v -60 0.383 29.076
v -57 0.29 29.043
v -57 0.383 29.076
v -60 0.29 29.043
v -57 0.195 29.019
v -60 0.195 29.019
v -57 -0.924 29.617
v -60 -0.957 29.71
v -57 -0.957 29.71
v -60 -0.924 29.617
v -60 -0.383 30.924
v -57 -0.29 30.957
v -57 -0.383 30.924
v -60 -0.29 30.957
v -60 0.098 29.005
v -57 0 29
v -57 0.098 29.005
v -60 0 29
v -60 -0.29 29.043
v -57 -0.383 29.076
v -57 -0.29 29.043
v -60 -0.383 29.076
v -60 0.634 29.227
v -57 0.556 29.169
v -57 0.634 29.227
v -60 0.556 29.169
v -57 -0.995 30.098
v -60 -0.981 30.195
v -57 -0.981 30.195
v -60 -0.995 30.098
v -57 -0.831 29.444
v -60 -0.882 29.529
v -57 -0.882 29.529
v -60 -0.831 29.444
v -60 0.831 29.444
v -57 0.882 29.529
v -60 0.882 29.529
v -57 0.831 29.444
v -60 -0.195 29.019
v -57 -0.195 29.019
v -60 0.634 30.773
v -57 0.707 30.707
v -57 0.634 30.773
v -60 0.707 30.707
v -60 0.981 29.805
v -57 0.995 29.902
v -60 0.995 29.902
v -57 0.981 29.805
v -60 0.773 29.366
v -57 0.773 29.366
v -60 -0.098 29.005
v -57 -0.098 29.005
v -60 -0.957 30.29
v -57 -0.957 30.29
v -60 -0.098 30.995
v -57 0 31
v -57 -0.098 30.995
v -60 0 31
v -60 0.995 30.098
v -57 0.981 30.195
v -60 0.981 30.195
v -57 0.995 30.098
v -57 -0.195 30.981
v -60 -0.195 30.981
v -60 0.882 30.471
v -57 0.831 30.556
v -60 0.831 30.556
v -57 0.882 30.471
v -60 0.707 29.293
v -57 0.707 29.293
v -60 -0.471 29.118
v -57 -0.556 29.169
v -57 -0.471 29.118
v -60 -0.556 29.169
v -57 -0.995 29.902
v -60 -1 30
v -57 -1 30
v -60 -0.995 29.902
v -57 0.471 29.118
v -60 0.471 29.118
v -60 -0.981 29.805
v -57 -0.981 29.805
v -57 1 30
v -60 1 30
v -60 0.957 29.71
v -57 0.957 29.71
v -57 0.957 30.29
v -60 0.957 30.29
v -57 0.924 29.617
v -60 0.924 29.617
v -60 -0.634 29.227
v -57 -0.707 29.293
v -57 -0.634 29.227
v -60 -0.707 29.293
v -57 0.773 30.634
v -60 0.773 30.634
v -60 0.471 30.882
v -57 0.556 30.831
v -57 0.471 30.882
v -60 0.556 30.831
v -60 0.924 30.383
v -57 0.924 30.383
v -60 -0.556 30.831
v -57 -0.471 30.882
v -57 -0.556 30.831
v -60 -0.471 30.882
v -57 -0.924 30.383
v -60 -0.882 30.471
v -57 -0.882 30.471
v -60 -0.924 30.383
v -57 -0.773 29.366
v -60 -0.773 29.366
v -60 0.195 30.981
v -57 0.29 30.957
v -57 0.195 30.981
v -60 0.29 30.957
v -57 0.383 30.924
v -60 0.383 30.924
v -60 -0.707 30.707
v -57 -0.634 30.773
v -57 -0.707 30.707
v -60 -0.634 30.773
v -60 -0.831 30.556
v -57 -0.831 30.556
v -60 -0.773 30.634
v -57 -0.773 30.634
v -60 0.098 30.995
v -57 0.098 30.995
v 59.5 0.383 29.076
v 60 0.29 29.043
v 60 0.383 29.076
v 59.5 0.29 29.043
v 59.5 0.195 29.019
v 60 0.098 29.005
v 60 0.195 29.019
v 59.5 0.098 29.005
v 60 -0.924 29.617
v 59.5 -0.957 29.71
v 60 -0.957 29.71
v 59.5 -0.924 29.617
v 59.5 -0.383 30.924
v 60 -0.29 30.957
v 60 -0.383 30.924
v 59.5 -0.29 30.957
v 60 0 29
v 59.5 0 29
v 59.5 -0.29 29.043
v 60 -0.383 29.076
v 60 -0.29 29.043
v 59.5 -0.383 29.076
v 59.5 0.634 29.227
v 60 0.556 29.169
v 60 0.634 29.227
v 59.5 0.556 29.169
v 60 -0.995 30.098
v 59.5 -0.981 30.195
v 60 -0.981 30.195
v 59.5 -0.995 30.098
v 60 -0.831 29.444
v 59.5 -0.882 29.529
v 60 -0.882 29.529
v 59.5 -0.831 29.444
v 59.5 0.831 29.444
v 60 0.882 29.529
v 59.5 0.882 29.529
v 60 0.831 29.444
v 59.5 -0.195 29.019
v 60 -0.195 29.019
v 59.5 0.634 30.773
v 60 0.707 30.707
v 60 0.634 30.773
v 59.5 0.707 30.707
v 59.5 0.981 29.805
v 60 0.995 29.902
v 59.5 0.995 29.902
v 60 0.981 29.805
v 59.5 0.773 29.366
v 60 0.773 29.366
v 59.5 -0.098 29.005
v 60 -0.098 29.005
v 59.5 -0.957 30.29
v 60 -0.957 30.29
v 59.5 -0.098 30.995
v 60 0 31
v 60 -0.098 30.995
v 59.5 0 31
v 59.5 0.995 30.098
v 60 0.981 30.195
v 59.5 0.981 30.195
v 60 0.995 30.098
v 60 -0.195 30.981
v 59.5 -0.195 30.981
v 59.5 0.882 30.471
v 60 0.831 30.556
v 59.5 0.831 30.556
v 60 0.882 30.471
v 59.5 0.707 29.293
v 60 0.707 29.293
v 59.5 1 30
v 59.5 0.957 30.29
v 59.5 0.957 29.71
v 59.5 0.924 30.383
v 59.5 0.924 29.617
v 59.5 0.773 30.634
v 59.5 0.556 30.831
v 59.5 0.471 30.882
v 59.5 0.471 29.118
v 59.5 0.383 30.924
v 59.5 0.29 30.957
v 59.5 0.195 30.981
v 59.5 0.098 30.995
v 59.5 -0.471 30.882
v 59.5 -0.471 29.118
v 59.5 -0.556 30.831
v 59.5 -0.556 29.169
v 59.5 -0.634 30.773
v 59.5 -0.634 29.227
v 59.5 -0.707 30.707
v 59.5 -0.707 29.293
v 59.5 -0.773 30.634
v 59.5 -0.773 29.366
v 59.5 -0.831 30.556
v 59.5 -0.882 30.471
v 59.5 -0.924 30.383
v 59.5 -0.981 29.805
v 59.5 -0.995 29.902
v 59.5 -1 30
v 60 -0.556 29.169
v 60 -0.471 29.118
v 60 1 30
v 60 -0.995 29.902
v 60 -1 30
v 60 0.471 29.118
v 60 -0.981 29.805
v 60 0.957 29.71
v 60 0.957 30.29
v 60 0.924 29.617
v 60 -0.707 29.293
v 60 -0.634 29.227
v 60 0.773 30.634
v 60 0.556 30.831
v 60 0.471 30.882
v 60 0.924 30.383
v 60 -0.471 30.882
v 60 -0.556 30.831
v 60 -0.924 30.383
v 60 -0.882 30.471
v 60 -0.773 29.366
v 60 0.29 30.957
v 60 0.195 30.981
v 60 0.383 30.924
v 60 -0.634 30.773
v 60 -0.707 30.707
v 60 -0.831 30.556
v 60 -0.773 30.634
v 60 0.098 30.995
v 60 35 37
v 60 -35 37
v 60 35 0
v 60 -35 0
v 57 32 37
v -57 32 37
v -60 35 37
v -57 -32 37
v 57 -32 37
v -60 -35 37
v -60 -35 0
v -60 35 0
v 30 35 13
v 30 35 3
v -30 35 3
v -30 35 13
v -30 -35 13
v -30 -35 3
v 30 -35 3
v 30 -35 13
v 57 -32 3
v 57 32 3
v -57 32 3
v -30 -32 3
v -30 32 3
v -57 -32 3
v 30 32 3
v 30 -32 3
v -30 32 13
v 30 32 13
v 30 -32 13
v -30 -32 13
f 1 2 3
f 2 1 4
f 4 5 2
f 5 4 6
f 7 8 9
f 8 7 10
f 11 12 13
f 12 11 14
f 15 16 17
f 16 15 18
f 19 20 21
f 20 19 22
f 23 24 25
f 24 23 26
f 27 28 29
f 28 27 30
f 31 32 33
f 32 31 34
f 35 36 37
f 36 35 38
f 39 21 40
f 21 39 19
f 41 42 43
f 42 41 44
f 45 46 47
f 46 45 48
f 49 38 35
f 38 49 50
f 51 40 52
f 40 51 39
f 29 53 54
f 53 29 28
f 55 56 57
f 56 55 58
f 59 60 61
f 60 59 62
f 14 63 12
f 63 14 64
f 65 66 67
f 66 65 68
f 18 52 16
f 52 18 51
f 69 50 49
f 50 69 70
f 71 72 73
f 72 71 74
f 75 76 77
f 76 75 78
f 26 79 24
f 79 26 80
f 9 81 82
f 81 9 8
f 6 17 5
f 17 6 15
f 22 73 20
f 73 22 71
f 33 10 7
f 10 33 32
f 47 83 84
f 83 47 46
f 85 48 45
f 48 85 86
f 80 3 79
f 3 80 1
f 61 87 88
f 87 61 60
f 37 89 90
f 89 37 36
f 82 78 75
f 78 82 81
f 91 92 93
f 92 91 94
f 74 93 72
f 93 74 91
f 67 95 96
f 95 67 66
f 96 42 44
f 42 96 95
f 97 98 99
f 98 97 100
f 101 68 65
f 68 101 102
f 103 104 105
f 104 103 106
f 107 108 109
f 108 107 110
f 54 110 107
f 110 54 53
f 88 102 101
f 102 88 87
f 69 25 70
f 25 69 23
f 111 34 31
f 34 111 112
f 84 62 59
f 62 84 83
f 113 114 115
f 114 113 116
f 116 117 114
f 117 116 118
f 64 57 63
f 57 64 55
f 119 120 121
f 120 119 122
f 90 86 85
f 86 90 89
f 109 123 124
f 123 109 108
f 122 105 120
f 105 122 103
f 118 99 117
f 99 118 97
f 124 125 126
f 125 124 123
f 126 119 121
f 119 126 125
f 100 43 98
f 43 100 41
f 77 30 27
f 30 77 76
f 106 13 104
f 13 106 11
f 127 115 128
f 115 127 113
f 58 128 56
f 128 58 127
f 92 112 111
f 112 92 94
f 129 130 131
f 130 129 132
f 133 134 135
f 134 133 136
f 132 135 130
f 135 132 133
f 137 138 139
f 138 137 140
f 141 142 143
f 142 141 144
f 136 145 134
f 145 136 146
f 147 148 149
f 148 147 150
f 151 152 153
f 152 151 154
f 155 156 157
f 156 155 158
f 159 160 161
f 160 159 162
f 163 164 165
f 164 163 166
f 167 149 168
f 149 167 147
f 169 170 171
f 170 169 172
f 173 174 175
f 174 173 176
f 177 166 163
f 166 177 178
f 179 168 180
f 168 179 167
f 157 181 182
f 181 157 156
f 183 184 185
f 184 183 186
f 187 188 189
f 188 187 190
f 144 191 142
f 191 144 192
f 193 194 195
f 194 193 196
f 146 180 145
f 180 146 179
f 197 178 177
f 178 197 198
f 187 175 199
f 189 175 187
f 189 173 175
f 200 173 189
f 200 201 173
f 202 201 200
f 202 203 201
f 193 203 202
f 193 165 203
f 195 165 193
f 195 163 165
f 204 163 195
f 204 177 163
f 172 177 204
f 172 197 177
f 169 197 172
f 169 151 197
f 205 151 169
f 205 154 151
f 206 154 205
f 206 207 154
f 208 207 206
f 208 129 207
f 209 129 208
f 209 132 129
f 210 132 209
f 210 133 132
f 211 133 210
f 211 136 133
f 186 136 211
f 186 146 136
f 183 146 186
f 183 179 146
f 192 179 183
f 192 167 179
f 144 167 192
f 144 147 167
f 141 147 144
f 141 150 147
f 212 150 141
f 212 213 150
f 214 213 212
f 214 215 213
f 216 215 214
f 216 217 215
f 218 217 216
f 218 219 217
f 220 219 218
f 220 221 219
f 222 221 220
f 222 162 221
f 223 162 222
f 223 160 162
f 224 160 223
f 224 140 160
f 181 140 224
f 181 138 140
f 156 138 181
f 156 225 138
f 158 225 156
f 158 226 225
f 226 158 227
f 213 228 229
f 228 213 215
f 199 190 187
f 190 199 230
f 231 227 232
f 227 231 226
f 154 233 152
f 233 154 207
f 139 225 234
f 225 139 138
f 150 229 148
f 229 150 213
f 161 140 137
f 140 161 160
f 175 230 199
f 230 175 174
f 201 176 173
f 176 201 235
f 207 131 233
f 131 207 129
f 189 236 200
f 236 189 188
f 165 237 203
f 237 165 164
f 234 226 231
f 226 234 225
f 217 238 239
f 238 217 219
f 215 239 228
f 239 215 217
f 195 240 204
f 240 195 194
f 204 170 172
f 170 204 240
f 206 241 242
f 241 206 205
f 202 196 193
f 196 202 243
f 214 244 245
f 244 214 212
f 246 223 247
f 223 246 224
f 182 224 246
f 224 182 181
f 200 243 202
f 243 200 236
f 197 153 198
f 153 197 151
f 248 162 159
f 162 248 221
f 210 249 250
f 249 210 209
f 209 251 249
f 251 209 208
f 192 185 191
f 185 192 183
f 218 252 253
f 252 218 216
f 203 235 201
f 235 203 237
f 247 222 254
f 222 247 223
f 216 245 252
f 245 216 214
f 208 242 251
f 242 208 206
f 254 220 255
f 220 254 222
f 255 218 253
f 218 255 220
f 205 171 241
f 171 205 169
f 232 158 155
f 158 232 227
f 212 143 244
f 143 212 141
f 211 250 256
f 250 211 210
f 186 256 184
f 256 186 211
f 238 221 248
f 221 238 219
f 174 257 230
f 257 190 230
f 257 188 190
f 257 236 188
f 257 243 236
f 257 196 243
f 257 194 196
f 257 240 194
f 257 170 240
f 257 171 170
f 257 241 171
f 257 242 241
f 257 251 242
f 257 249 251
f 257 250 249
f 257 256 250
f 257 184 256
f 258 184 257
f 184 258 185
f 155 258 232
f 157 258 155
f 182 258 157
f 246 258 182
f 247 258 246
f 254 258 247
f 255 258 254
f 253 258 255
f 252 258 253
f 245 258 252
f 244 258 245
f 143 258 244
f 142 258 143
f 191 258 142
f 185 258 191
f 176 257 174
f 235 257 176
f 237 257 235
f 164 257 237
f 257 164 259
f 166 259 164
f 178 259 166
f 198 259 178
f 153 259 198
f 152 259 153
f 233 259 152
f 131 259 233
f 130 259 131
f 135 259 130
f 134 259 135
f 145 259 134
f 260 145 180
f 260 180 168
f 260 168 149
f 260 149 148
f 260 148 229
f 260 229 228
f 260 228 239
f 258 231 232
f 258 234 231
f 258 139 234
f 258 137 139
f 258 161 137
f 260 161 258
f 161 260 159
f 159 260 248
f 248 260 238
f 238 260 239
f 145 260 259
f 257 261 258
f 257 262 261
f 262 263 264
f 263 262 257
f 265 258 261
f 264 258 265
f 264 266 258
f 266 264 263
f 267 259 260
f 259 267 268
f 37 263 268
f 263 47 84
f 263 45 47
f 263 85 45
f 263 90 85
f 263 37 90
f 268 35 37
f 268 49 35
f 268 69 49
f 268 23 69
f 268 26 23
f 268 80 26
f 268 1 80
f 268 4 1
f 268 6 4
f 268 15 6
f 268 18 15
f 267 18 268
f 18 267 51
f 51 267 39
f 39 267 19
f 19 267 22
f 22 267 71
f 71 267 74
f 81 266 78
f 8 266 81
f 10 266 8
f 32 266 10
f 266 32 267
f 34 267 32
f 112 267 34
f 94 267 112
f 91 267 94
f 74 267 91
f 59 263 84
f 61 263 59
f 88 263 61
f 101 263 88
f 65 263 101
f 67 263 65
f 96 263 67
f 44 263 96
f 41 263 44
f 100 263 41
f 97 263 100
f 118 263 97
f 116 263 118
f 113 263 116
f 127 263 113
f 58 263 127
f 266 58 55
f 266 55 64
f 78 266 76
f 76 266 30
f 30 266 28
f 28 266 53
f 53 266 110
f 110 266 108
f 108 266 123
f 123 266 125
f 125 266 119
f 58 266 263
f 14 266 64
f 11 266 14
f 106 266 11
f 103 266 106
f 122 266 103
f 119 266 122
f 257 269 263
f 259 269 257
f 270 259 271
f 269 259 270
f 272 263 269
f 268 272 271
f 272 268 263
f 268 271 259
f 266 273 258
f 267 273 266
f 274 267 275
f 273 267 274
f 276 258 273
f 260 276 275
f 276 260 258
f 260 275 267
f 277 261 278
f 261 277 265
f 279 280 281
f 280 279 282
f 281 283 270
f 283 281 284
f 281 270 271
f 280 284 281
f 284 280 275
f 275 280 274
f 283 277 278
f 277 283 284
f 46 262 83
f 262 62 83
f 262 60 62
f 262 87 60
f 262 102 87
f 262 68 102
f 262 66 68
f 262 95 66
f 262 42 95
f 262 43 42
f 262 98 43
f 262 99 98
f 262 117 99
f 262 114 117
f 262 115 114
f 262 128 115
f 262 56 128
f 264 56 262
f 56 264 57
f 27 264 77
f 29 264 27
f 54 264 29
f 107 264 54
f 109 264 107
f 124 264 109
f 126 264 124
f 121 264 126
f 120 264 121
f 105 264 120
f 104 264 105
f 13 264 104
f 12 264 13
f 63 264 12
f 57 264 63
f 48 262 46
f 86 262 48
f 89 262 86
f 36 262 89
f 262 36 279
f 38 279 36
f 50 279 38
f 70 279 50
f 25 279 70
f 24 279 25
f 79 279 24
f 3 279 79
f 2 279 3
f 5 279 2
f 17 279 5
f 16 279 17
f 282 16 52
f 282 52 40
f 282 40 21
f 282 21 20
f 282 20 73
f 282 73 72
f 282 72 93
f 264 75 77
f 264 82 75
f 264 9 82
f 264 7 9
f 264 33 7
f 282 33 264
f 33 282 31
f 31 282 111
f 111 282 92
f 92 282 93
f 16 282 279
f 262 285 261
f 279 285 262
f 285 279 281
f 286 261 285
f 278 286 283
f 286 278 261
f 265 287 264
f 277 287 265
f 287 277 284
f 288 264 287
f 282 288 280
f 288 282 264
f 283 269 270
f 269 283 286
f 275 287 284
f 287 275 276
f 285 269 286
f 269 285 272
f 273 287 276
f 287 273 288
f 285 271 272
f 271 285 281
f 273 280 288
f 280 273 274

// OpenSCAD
// Mini horizontal gel-electrophoresis box - buffer tank
// Print orientation: tank rests on XY plane, builds up in +Z

$fn = 64;

// ---- Tank dimensions ----
outer_x = 120;   // outer length along X
outer_y = 70;    // outer width along Y
outer_z = 40;    // outer height along Z
wall    = 3;     // wall thickness (X and Y)
floor   = 3;     // floor thickness under the inner floor

// ---- Platform dimensions ----
plat_x     = 60;   // platform length along X (centred)
plat_w     = outer_y; // platform spans full inner width
plat_top_z = 13;   // height of platform top (10 mm above inner floor)

// ---- Wire holes ----
hole_d = 2;     // electrode hole diameter
hole_y = 0;     // hole Y position
hole_z = 30;    // hole Z position

// ---- Cutting overlap ----
eps = 0.5;      // extension past cut faces

difference() {
    // Tank body (outer block minus floor thickness)
    translate([-outer_x/2, -outer_y/2, 0])
        cube([outer_x, outer_y, outer_z - floor]);

    // Inner cavity (open top)
    translate([-outer_x/2 + wall, -outer_y/2 + wall, floor])
        cube([outer_x - 2*wall, outer_y - 2*wall, outer_z - floor]);

    // Raised platform for gel tray
    translate([-plat_x/2, -plat_w/2, plat_top_z - 10])
        cube([plat_x, plat_w, 10]);

    // Electrode wire holes through end walls
    for (sx = [-1, 1])
        translate([sx > 0 ? outer_x/2 - eps : -outer_x/2 - eps, hole_y, hole_z])
            rotate([0, 90, 0])
                cylinder(d = hole_d, h = outer_y + 2*eps);
}
